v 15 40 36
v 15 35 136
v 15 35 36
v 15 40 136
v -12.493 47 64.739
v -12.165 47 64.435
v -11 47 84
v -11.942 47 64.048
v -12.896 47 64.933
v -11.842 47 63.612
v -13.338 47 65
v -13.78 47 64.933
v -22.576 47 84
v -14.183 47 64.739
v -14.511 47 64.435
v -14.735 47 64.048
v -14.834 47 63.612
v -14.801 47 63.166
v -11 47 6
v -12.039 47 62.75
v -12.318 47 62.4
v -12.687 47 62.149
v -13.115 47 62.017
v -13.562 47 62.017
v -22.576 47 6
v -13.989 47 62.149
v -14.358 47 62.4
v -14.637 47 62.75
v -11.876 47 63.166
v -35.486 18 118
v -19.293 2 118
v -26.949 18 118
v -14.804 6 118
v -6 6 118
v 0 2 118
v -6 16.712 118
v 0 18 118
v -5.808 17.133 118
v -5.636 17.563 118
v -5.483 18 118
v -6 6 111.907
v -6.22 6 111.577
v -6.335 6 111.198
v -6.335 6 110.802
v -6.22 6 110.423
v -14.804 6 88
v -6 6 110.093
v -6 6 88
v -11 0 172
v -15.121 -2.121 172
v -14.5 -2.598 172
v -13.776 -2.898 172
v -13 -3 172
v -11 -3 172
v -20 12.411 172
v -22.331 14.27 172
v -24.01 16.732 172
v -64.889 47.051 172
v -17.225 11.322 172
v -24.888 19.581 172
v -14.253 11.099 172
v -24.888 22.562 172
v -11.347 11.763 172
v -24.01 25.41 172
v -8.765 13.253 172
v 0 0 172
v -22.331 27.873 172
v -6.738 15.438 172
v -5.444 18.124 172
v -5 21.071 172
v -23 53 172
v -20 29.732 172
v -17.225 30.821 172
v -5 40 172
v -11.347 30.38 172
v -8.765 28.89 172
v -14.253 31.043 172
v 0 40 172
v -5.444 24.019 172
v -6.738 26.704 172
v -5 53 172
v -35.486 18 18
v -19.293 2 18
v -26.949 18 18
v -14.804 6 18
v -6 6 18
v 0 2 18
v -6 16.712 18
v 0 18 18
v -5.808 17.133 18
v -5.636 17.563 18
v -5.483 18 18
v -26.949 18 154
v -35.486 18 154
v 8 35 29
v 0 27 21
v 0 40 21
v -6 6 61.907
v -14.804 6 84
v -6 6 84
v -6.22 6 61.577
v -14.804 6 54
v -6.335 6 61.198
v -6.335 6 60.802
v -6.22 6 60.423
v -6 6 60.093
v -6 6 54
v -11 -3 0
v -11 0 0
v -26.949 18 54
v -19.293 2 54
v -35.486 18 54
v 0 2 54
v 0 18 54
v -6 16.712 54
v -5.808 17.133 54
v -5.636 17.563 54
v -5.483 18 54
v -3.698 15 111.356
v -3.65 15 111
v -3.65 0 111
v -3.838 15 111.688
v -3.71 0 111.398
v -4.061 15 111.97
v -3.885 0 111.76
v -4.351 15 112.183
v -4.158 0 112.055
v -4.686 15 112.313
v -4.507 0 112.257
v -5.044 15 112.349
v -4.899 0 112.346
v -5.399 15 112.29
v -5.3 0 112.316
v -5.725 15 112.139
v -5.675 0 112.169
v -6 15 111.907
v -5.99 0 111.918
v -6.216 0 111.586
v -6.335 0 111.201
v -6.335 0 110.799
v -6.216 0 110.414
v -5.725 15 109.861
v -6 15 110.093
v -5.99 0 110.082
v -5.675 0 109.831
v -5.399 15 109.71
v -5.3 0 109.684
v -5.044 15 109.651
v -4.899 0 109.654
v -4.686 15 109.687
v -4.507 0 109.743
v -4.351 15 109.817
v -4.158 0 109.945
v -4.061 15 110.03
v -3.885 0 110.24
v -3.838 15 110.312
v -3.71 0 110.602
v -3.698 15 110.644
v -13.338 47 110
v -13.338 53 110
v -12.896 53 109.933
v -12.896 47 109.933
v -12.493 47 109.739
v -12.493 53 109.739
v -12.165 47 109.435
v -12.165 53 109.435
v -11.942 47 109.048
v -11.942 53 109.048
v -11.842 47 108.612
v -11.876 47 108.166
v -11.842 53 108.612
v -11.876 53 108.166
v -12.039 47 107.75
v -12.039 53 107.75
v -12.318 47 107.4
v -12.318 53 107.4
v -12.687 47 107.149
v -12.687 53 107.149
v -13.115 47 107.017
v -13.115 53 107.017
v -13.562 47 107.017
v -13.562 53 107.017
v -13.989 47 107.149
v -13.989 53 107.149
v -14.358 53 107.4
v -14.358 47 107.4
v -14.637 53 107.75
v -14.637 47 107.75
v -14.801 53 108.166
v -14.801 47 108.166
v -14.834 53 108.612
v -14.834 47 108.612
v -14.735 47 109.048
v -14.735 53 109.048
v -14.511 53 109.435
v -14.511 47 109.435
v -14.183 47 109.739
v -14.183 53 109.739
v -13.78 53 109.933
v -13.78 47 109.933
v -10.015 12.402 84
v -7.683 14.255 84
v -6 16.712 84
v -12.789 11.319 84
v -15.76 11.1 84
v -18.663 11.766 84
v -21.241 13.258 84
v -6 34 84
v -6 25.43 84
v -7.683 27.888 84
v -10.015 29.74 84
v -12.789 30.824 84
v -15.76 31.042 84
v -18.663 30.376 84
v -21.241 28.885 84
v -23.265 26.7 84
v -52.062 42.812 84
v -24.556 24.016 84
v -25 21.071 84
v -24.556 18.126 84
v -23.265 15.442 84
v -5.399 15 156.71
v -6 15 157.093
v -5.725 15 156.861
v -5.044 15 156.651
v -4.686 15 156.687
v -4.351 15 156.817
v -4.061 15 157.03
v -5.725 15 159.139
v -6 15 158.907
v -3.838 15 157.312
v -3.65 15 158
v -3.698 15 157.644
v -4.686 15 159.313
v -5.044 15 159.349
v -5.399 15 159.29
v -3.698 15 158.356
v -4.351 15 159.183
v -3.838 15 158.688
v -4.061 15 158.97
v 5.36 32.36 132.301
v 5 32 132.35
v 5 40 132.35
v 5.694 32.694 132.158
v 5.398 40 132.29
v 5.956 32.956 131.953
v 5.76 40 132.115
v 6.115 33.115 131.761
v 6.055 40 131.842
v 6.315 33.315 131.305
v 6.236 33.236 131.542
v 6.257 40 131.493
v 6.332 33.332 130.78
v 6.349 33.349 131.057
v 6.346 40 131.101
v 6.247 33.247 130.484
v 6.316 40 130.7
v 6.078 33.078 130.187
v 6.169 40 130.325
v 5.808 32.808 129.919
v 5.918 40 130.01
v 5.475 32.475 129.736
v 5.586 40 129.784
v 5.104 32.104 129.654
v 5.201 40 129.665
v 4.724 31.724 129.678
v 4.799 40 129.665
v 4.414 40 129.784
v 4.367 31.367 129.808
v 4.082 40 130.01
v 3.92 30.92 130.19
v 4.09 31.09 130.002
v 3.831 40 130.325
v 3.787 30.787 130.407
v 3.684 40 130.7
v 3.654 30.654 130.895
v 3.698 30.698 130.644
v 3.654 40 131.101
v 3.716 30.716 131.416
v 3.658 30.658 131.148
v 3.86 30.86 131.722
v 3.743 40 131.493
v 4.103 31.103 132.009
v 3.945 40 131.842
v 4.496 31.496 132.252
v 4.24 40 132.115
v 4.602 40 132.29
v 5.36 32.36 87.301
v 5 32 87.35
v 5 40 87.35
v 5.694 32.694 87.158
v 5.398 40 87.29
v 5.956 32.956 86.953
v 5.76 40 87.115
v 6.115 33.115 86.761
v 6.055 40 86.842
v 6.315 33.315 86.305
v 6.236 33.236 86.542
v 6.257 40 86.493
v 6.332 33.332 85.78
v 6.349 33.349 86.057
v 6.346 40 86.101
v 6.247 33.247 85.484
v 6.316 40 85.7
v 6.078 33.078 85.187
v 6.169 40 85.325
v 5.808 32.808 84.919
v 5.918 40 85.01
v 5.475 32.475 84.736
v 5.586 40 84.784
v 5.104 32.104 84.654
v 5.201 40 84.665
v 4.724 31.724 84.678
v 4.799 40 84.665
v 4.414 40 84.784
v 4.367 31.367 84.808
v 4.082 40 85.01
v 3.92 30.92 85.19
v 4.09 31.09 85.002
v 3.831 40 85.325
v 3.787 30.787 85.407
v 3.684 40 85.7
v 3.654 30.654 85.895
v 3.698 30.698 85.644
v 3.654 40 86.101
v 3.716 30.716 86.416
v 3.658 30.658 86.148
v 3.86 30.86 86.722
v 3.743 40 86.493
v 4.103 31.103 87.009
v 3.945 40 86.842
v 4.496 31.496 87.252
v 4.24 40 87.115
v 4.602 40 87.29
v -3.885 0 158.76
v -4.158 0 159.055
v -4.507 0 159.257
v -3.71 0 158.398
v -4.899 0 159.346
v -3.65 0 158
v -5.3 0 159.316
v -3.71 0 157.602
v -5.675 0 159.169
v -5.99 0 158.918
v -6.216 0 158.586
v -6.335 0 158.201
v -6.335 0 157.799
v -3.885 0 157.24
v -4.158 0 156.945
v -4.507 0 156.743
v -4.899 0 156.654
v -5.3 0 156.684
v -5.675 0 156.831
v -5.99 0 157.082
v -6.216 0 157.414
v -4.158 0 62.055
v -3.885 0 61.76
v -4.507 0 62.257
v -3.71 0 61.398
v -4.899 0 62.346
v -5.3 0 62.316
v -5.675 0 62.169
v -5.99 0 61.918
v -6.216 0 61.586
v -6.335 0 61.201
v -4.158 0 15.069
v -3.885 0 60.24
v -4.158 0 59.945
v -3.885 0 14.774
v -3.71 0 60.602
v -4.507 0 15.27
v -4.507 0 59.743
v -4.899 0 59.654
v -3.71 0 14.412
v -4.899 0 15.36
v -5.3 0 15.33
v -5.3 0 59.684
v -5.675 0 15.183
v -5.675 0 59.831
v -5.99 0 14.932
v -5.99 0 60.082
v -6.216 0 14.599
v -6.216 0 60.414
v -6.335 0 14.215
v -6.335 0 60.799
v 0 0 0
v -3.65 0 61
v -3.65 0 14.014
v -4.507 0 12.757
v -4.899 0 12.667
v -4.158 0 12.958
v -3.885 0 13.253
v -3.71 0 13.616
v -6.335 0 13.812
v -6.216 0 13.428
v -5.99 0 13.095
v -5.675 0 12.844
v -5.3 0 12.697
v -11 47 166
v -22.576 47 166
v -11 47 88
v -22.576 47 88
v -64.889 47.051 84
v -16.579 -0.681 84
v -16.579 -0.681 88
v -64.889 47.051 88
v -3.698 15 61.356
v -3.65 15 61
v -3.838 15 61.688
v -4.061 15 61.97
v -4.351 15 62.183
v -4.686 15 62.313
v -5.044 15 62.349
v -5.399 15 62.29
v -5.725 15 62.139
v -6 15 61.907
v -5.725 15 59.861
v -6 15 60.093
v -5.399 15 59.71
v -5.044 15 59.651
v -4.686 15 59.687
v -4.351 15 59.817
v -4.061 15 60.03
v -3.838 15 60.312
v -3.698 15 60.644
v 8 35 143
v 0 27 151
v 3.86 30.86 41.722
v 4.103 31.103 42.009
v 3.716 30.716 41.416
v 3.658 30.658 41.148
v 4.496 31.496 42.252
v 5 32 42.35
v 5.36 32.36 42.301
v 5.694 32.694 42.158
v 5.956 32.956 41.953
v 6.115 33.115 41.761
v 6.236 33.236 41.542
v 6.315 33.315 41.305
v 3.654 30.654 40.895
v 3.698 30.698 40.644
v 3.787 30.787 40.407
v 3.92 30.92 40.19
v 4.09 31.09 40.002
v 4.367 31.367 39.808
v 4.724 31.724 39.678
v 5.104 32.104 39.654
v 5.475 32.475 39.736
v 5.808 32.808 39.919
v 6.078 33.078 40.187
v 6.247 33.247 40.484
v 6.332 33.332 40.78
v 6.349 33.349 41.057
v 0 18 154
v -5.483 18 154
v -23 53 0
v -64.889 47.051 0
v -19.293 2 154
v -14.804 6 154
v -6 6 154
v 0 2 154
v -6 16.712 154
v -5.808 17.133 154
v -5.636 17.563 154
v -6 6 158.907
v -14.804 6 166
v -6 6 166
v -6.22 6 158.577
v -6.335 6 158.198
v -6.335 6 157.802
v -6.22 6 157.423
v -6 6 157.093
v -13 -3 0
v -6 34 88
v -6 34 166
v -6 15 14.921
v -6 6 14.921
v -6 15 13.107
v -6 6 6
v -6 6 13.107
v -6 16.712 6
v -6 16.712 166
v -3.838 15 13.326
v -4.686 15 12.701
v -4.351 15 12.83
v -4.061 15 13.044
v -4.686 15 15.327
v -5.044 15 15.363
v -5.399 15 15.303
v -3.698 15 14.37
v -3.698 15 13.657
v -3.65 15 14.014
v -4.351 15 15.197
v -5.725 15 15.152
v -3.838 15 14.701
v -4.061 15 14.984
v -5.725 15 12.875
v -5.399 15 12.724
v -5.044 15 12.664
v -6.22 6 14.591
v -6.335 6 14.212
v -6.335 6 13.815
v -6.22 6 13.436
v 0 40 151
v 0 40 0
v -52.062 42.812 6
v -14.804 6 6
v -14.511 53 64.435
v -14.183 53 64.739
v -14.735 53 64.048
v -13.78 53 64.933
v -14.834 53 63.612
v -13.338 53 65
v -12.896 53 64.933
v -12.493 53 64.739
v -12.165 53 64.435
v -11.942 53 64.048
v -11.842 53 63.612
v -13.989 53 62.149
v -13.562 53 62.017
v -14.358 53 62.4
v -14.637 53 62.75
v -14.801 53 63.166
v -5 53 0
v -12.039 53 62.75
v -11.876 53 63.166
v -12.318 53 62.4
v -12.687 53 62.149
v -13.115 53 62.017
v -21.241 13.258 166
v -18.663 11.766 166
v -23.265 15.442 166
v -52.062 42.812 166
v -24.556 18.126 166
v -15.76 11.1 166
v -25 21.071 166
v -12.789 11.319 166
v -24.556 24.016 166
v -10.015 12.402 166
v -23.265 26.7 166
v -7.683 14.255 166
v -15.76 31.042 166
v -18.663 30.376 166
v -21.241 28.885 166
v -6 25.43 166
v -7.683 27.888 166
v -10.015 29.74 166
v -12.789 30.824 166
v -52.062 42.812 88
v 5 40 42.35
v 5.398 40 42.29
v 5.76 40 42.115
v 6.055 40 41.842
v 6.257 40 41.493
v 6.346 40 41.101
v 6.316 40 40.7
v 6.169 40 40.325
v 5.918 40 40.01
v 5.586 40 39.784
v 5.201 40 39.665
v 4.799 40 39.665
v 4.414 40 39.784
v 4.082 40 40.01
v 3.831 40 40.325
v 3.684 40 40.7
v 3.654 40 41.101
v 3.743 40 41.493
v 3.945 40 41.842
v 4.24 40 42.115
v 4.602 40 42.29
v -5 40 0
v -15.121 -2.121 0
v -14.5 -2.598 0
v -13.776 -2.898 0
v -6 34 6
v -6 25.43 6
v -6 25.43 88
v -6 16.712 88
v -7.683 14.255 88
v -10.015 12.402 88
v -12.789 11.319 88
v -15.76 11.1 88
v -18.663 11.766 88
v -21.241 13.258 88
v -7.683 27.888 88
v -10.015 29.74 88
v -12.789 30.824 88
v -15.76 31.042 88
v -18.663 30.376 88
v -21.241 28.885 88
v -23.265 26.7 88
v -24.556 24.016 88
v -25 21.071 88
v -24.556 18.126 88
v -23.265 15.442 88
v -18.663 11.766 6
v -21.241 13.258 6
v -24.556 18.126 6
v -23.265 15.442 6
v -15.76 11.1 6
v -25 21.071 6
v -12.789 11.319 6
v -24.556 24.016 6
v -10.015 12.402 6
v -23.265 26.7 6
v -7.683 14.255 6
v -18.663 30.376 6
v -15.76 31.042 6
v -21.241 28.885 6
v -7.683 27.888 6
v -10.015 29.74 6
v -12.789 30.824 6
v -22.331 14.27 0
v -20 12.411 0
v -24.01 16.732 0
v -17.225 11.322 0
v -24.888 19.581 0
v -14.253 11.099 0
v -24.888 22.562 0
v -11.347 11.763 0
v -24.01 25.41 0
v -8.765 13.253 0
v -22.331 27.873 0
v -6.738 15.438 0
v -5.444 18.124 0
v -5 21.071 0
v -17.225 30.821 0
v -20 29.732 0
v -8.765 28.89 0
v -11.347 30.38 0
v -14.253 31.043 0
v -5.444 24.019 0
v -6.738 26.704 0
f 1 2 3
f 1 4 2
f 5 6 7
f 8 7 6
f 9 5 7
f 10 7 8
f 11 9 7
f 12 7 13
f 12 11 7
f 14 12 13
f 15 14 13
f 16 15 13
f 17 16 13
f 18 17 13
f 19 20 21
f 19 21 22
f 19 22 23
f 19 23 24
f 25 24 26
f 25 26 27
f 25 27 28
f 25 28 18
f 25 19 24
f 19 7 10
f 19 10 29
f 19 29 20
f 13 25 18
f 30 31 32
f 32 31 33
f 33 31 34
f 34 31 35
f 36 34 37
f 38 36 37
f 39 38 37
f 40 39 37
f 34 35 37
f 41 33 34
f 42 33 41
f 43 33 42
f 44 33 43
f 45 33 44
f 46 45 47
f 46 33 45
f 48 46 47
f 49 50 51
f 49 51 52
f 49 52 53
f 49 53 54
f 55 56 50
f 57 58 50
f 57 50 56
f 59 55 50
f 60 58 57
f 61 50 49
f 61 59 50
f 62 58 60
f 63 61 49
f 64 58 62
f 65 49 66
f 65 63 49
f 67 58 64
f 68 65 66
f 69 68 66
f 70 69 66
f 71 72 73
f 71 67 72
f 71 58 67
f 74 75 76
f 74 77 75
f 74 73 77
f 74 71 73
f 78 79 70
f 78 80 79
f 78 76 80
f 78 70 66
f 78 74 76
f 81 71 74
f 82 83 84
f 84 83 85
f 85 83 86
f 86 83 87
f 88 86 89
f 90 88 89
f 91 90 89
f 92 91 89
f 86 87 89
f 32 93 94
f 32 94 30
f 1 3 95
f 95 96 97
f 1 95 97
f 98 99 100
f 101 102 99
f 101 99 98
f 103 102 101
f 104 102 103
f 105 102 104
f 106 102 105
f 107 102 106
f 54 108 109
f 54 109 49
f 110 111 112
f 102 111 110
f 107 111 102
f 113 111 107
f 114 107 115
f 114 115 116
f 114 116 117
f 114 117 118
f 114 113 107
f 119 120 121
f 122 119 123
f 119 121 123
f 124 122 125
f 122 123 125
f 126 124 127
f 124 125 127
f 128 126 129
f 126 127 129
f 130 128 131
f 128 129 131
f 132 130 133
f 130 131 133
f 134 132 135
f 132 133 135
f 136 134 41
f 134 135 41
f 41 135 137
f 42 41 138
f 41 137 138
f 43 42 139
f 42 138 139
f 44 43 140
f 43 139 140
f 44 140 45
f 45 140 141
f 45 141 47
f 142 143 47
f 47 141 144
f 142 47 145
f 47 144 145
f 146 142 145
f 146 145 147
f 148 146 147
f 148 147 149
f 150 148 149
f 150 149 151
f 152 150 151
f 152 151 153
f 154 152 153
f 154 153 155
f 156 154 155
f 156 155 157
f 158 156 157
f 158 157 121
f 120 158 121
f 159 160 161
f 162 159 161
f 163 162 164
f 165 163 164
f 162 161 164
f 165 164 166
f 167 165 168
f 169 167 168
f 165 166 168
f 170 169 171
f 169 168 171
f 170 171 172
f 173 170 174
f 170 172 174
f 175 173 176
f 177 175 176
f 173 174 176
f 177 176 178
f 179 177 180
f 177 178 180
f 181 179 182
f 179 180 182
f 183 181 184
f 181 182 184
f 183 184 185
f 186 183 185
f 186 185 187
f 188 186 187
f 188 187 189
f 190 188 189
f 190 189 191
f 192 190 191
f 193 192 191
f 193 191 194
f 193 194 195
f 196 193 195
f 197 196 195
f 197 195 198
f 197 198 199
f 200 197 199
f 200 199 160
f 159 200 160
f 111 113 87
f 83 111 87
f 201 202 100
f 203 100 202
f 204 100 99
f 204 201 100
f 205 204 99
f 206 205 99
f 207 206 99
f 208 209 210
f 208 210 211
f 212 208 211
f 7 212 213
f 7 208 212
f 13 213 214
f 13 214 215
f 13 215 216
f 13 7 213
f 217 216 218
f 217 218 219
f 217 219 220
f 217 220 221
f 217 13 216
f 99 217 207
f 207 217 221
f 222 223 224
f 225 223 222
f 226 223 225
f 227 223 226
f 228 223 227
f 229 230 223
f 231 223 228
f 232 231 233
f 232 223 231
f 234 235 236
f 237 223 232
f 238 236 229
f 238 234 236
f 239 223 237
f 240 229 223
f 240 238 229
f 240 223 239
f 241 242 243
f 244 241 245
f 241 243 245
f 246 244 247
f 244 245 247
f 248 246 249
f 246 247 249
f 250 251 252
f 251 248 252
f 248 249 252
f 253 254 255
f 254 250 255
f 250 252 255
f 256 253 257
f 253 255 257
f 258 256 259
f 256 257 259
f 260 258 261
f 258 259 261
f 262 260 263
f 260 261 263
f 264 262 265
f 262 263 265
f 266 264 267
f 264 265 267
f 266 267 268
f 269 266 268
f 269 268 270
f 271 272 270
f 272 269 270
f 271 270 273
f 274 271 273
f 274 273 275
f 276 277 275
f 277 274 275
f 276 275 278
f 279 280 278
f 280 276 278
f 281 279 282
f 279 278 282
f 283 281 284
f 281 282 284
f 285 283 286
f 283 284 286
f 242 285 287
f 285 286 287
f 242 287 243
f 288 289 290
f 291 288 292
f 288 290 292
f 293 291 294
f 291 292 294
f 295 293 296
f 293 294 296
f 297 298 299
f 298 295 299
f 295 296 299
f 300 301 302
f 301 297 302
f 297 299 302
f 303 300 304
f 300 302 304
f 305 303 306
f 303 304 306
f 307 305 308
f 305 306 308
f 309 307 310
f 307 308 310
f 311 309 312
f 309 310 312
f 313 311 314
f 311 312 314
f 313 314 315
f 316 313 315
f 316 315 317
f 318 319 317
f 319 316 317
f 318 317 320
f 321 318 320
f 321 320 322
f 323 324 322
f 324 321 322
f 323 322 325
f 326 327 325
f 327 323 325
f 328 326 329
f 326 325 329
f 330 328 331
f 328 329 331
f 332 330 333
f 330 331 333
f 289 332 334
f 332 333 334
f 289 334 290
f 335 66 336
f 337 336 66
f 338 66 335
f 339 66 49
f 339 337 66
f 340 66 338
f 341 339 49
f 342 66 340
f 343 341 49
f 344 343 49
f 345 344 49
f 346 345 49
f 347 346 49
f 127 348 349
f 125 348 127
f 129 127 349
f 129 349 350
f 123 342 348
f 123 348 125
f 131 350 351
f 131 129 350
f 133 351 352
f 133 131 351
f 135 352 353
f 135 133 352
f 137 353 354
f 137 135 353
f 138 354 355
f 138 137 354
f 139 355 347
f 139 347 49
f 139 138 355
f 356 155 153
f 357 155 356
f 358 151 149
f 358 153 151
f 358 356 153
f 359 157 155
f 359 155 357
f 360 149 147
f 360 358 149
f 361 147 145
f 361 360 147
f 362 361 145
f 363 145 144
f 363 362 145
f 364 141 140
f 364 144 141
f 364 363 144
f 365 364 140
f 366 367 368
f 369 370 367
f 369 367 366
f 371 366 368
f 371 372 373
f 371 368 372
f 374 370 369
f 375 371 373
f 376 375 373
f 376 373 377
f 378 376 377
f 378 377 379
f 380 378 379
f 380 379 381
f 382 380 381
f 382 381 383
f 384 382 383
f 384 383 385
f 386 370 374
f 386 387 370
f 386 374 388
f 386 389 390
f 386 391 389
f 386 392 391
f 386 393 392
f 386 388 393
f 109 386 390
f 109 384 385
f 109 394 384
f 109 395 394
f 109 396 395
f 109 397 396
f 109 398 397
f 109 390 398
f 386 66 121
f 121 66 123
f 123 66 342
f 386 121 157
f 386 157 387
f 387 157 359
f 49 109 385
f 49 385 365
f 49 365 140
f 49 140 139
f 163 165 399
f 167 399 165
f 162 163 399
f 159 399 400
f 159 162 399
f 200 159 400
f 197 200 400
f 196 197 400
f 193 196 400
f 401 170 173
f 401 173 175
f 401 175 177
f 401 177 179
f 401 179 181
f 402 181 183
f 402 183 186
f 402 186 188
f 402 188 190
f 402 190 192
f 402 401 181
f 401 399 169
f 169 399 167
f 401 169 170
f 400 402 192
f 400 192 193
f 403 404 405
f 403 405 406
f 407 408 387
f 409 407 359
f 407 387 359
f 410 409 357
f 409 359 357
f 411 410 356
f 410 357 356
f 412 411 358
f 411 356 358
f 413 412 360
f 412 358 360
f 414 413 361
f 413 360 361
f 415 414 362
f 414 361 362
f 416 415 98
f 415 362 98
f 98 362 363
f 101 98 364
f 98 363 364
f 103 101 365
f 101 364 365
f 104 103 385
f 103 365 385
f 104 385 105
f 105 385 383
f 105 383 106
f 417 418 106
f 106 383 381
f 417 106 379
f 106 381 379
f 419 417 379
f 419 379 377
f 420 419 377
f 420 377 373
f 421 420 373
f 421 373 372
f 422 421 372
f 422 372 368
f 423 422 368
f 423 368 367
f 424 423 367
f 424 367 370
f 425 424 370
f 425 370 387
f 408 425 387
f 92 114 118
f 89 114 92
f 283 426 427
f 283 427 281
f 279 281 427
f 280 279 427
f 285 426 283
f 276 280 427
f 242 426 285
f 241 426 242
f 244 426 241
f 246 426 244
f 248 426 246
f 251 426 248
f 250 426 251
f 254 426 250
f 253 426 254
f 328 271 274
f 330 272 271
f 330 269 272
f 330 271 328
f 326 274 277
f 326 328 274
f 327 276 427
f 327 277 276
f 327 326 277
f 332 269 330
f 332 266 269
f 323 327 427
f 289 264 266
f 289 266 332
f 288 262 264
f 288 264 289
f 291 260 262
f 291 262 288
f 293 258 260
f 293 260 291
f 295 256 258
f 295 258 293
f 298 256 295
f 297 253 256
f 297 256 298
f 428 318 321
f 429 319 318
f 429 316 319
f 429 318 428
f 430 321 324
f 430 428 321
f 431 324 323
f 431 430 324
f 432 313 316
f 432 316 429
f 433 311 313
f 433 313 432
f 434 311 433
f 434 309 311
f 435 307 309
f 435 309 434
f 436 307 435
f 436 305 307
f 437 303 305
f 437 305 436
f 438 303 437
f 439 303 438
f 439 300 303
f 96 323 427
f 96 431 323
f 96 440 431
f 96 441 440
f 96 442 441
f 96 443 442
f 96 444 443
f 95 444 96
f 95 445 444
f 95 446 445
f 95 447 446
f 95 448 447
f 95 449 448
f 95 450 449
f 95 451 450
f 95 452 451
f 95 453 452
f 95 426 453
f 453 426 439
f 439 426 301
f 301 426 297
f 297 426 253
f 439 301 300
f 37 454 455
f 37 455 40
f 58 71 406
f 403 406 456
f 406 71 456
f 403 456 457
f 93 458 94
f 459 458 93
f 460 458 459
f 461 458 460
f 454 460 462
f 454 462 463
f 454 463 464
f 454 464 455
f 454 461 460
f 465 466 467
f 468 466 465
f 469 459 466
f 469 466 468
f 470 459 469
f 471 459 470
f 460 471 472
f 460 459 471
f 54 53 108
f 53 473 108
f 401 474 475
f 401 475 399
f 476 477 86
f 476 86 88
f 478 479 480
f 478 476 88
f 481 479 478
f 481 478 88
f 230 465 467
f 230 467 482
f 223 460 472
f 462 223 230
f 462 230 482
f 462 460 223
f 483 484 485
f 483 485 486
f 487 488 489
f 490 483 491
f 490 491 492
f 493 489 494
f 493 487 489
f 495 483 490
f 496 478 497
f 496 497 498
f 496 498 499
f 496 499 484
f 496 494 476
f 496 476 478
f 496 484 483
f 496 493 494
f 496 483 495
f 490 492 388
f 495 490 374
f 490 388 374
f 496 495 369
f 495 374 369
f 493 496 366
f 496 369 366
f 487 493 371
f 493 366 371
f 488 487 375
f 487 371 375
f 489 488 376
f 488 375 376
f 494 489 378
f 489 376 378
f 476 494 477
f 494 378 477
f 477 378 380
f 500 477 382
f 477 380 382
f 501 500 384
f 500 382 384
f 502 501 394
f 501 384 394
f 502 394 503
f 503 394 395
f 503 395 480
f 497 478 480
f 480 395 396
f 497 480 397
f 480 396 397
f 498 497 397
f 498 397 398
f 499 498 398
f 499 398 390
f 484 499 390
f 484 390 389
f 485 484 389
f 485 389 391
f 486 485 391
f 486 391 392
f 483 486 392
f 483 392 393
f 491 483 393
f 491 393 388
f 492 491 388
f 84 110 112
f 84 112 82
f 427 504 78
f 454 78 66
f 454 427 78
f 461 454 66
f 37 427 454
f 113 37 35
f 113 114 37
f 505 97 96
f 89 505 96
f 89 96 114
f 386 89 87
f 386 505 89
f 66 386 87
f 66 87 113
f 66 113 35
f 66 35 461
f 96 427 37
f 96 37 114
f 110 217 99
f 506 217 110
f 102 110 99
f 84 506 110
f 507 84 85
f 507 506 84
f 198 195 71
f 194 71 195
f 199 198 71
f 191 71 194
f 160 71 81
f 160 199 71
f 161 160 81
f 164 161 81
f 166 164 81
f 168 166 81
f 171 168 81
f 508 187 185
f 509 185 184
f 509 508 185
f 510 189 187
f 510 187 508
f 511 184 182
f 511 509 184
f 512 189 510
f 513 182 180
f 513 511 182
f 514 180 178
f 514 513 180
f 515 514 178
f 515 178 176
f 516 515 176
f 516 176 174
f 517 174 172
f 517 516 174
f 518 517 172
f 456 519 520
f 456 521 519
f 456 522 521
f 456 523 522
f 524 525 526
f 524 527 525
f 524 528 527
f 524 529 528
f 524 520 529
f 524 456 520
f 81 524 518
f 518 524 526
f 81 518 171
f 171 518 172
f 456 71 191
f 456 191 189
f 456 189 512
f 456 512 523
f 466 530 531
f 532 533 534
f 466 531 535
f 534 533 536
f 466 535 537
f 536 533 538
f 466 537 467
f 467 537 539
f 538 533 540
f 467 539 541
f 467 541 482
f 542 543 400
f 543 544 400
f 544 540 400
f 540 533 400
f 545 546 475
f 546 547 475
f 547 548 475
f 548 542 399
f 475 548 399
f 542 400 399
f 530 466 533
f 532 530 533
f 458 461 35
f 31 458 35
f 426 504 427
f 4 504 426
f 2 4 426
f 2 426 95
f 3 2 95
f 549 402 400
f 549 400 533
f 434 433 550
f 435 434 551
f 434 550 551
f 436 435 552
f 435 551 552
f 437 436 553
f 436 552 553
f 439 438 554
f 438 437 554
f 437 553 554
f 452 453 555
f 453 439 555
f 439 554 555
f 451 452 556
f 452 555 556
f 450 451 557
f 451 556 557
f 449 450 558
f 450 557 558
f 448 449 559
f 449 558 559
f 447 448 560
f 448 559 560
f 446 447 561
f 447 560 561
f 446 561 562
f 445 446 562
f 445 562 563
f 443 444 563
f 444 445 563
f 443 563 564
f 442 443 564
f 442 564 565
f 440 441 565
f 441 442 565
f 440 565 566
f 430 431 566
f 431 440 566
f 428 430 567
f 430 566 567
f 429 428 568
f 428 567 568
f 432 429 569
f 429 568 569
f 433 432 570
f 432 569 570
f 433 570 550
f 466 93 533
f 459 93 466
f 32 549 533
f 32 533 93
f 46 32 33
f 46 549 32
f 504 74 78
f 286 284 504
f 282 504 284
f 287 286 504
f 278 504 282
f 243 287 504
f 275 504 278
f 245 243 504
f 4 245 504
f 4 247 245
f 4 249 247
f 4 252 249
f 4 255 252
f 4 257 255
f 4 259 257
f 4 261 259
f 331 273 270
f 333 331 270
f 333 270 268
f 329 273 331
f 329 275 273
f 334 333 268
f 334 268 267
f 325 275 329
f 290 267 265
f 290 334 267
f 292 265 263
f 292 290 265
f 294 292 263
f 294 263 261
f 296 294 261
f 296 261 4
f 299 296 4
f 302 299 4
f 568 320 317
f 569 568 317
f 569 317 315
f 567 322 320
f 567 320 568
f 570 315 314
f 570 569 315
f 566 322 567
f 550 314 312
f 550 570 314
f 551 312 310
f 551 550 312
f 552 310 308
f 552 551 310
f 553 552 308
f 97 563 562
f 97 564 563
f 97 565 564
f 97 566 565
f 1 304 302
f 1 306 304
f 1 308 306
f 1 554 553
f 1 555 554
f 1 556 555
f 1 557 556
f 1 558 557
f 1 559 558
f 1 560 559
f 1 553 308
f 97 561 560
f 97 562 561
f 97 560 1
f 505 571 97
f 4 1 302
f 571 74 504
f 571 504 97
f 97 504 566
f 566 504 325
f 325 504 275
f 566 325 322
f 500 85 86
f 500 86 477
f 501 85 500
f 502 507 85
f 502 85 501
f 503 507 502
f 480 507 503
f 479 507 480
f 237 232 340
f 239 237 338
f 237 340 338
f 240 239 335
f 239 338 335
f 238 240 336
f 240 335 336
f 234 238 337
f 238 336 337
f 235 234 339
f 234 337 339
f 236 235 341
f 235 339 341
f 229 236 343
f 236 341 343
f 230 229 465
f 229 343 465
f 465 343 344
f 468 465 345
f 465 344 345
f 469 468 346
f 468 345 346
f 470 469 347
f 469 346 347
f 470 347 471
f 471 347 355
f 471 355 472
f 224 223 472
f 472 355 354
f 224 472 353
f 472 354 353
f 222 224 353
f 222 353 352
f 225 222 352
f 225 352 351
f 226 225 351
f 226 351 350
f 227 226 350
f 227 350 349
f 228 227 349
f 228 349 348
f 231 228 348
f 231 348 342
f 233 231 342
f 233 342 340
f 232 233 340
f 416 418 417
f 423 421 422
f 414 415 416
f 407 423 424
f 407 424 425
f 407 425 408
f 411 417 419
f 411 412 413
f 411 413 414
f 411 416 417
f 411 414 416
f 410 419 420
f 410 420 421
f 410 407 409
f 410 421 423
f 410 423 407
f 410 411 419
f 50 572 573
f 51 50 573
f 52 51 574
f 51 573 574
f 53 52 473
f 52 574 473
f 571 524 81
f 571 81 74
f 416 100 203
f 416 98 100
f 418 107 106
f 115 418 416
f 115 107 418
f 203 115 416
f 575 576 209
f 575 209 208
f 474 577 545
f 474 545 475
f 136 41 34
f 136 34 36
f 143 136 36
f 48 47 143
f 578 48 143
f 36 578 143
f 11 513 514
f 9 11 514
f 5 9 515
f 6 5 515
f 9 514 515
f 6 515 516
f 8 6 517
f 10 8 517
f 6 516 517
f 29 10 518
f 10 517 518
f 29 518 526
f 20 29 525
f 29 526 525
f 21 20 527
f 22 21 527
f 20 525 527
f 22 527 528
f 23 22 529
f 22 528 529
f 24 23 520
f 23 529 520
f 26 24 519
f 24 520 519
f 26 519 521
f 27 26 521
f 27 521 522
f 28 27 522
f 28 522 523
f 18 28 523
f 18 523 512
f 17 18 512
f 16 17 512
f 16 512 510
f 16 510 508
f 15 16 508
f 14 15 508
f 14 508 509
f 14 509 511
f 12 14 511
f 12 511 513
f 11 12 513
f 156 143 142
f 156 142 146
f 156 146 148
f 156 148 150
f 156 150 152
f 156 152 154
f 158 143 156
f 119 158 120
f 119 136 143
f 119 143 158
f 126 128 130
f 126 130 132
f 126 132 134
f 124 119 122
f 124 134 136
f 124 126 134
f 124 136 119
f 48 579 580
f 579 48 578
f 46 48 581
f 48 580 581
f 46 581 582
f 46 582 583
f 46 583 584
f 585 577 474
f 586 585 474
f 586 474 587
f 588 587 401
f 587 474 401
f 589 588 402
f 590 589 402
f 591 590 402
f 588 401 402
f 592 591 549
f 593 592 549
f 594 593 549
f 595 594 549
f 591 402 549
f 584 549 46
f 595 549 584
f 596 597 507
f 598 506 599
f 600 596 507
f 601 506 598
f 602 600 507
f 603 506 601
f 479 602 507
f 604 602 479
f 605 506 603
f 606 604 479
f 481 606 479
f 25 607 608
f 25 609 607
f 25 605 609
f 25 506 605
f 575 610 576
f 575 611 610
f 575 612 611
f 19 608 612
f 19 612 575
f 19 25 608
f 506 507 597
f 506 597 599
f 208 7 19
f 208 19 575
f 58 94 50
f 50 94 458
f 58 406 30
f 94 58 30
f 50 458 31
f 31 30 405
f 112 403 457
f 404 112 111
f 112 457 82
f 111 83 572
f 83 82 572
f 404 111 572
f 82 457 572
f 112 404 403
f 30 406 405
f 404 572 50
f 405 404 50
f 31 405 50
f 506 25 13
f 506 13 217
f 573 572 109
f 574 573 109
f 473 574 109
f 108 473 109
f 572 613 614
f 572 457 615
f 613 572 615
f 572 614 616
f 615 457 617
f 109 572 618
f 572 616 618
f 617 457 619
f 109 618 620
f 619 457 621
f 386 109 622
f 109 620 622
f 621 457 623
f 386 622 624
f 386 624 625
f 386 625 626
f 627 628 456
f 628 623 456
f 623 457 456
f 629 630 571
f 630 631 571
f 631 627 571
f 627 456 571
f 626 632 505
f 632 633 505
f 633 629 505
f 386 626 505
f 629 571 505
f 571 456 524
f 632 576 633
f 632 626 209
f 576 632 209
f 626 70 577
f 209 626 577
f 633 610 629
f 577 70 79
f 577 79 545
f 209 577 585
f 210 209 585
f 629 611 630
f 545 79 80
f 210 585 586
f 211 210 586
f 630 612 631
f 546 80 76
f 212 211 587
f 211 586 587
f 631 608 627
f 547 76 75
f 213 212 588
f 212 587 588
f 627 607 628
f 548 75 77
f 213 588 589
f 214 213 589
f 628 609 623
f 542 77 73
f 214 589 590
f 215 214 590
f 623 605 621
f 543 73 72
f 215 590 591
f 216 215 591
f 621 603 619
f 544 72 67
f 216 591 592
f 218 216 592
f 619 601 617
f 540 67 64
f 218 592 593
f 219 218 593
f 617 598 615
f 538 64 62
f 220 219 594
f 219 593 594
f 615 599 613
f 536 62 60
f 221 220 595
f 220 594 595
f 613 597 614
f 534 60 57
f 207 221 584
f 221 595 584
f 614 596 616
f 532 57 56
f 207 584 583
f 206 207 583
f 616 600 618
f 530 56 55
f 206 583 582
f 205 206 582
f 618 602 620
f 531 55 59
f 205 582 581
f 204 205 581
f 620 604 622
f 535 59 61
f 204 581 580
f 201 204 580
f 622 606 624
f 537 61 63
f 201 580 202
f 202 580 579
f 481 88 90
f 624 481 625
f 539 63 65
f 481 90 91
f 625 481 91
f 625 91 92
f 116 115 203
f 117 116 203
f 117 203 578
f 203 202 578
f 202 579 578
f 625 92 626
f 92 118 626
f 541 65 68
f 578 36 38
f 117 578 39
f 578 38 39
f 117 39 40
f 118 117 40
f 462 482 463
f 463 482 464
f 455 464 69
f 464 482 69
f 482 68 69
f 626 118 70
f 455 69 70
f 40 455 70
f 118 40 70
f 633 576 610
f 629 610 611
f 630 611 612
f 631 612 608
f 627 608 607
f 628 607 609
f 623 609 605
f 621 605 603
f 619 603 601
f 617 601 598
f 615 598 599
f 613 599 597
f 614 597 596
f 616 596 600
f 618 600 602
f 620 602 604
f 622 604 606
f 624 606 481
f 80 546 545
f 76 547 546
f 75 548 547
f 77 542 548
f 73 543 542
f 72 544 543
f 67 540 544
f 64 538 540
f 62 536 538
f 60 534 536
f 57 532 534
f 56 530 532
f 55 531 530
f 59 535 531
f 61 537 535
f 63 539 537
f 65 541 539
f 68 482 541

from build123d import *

# Parameters (mm, degrees)
EXTRUDE_1_DEPTH     = 172
SHELL_START         = 6
SHELL_1_DEPTH       = 160
SKETCH_2_W          = 36
SKETCH_2_H          = 16
CUT_EXTRUDE_1_DEPTH = 74
EXTRUDE_2_DEPTH     = 2
SKETCH_4_R          = 10
CUT_EXTRUDE_2_DEPTH = 186
SKETCH_5_R          = 1.5
CUT_EXTRUDE_3_DEPTH = 10
EXTRUDE_3_DEPTH     = 172
SKETCH_7_W          = 36
SKETCH_7_H          = 16
CUT_EXTRUDE_4_DEPTH = 172
SKETCH_8_W          = 6
SKETCH_8_H          = 172
CUT_EXTRUDE_5_DEPTH = 3
EXTRUDE_4_DEPTH     = 15
CHAMFER_1_SIZE      = 15
CHAMFER_2_SIZE      = 15
CHAMFER_3_SIZE      = 8
SKETCH_10_R         = 1.35
CUT_EXTRUDE_6_DEPTH = 15
SKETCH_12_R         = 1.35
CUT_EXTRUDE_7_DEPTH = 15
CUT_EXTRUDE_8_DEPTH = 78
CUT_EXTRUDE_9_DEPTH = 78


# Read off the part's stored shape, not the designer's step: 抽壳1
with BuildPart() as part:
    # 草图1 → 凸台-拉伸1 (new body)
    with BuildSketch(Plane.XY):
        with BuildLine():
            Line((0, 0), (0, 40))
            Line((0, 40), (-5, 40))
            Line((-5, 40), (-5, 53))
            Line((-5, 53), (-23, 53))
            Line((-23, 53), (-64.888578151, 47.050698608))
            Line((-64.888578151, 47.050698608), (-15.121320344, -2.121320344))
            ThreePointArc((-15.121320344, -2.121320344), (-14.148050297, -2.771638598), (-13, -3))
            Line((-13, -3), (-5, -3))
            Line((-5, -3), (-5, 0))
            Line((-5, 0), (0, 0))
        make_face()
    extrude(amount=EXTRUDE_1_DEPTH)

    # 抽壳1 outline → 抽壳1 (cut)
    with BuildSketch(Plane.XY.offset(SHELL_START)):
        Polygon((-11, 6), (-6, 6), (-6, 34), (-11, 34), (-11, 47), (-22.576046832, 47), (-52.061983815, 42.812206246), (-11.767841448, 3), (-11, 3), align=None)
    extrude(amount=SHELL_1_DEPTH, mode=Mode.SUBTRACT)

    # 草图2 → 切除-拉伸1 (cut)
    with BuildSketch(Plane(origin=(0, 0, 0), x_dir=(0, 0, -1), z_dir=(1, 0, 0))):
        with Locations((-136, 10)):
            Rectangle(SKETCH_2_W, SKETCH_2_H)
        with Locations((-36, 10)):
            Rectangle(SKETCH_2_W, SKETCH_2_H)
    extrude(amount=-CUT_EXTRUDE_1_DEPTH, mode=Mode.SUBTRACT)

    # 草图3 → 凸台-拉伸2 (add, symmetric)
    with BuildSketch(Plane(origin=(0, 0, 86), x_dir=(-1, 0, 0), z_dir=(0, 0, -1))):
        Polygon((5, 53), (5, 40), (0, 40), (0, 0), (5, 0), (5, -3), (13, -3), (16.579355858, -0.680723591), (64.888578151, 47.050698608), (23, 53), align=None)
    extrude(amount=EXTRUDE_2_DEPTH, both=True)

    # 草图4 → 切除-拉伸2 (cut)
    with BuildSketch(Plane.XY.offset(172)):
        with Locations((-15, 21.071297481)):
            Circle(SKETCH_4_R)
    extrude(amount=-CUT_EXTRUDE_2_DEPTH, mode=Mode.SUBTRACT)

    # 草图5 → 切除-拉伸3 (cut)
    with BuildSketch(Plane(origin=(0, 53, 0), x_dir=(1, 0, 0), z_dir=(0, 1, 0))):
        with Locations(Location((-13.338195438, -63.5, 0), (0, 0, 270))):
            Circle(SKETCH_5_R)
        with Locations(Location((-13.338195438, -108.5, 0), (0, 0, 270))):
            Circle(SKETCH_5_R)
    extrude(amount=-CUT_EXTRUDE_3_DEPTH, mode=Mode.SUBTRACT)

    # 草图6 → 凸台-拉伸3 (add)
    with BuildSketch(Plane.XY.offset(172)):
        Polygon((-11, 6), (-14.804157153, 6), (-11.767841448, 3), (-11, 3), align=None)
    extrude(amount=-EXTRUDE_3_DEPTH)

    # 草图7 → 切除-拉伸4 (cut)
    with BuildSketch(Plane(origin=(0, 0, 0), x_dir=(0, 0, -1), z_dir=(1, 0, 0))):
        with Locations((-136, 10)):
            Rectangle(SKETCH_7_W, SKETCH_7_H)
        with Locations((-36, 10)):
            Rectangle(SKETCH_7_W, SKETCH_7_H)
    extrude(amount=-CUT_EXTRUDE_4_DEPTH, mode=Mode.SUBTRACT)

    # 草图8 → 切除-拉伸5 (cut)
    with BuildSketch(Plane.XZ.offset(3)):
        with Locations((-8, 86)):
            Rectangle(SKETCH_8_W, SKETCH_8_H)
    extrude(amount=-CUT_EXTRUDE_5_DEPTH, mode=Mode.SUBTRACT)

    # 草图9 → 凸台-拉伸4 (add)
    with BuildSketch(Plane(origin=(0, 0, 0), x_dir=(0, 0, -1), z_dir=(1, 0, 0))):
        Polygon((-86, 40), (-151, 40), (-151, 35), (-86, 35), (-21, 35), (-21, 40), align=None)
    extrude(amount=EXTRUDE_4_DEPTH)

    # 倒角1
    chamfer_1_edges = [part.edges().sort_by_distance(p)[0] for p in [
        (15, 37.5, 151),
    ]]
    chamfer(chamfer_1_edges, length=CHAMFER_1_SIZE - 0.0001)  # a hair under: the kernel refuses the full size

    # 倒角2
    chamfer_2_edges = [part.edges().sort_by_distance(p)[0] for p in [
        (15, 37.5, 21),
    ]]
    chamfer(chamfer_2_edges, length=CHAMFER_2_SIZE - 0.0001)  # a hair under: the kernel refuses the full size

    # 倒角3
    chamfer_3_edges = [part.edges().sort_by_distance(p)[0] for p in [
        (0, 35, 86),
    ]]
    chamfer(chamfer_3_edges, length=CHAMFER_3_SIZE)

    # 草图10 → 切除-拉伸6 (cut)
    with BuildSketch(Plane.XZ):
        with Locations((-5, 158)):
            Circle(SKETCH_10_R)
        with Locations((-5, 111)):
            Circle(SKETCH_10_R)
        with Locations((-5, 61)):
            Circle(SKETCH_10_R)
        with Locations((-5, 14.01360213)):
            Circle(SKETCH_10_R)
    extrude(amount=-CUT_EXTRUDE_6_DEPTH, mode=Mode.SUBTRACT)

    # 草图12 → 切除-拉伸7 (cut)
    with BuildSketch(Plane(origin=(0, 40, 0), x_dir=(1, 0, 0), z_dir=(0, 1, 0))):
        with Locations(Location((5, -41, 0), (0, 0, 270))):
            Circle(SKETCH_12_R)
        with Locations(Location((5, -86, 0), (0, 0, 270))):
            Circle(SKETCH_12_R)
        with Locations(Location((5, -131, 0), (0, 0, 270))):
            Circle(SKETCH_12_R)
    extrude(amount=-CUT_EXTRUDE_7_DEPTH, mode=Mode.SUBTRACT)

    # 草图14 → 切除-拉伸8 (cut)
    with BuildSketch(Plane(origin=(0, 0, 84), x_dir=(-1, 0, 0), z_dir=(0, 0, -1))):
        Polygon((11, 47), (6, 34), (11, 34), align=None)
    extrude(amount=CUT_EXTRUDE_8_DEPTH, mode=Mode.SUBTRACT)

    # 草图16 → 切除-拉伸9 (cut)
    with BuildSketch(Plane.XY.offset(88)):
        Polygon((-11, 47), (-11, 34), (-6, 34), align=None)
    extrude(amount=CUT_EXTRUDE_9_DEPTH, mode=Mode.SUBTRACT)


solid = part.part
